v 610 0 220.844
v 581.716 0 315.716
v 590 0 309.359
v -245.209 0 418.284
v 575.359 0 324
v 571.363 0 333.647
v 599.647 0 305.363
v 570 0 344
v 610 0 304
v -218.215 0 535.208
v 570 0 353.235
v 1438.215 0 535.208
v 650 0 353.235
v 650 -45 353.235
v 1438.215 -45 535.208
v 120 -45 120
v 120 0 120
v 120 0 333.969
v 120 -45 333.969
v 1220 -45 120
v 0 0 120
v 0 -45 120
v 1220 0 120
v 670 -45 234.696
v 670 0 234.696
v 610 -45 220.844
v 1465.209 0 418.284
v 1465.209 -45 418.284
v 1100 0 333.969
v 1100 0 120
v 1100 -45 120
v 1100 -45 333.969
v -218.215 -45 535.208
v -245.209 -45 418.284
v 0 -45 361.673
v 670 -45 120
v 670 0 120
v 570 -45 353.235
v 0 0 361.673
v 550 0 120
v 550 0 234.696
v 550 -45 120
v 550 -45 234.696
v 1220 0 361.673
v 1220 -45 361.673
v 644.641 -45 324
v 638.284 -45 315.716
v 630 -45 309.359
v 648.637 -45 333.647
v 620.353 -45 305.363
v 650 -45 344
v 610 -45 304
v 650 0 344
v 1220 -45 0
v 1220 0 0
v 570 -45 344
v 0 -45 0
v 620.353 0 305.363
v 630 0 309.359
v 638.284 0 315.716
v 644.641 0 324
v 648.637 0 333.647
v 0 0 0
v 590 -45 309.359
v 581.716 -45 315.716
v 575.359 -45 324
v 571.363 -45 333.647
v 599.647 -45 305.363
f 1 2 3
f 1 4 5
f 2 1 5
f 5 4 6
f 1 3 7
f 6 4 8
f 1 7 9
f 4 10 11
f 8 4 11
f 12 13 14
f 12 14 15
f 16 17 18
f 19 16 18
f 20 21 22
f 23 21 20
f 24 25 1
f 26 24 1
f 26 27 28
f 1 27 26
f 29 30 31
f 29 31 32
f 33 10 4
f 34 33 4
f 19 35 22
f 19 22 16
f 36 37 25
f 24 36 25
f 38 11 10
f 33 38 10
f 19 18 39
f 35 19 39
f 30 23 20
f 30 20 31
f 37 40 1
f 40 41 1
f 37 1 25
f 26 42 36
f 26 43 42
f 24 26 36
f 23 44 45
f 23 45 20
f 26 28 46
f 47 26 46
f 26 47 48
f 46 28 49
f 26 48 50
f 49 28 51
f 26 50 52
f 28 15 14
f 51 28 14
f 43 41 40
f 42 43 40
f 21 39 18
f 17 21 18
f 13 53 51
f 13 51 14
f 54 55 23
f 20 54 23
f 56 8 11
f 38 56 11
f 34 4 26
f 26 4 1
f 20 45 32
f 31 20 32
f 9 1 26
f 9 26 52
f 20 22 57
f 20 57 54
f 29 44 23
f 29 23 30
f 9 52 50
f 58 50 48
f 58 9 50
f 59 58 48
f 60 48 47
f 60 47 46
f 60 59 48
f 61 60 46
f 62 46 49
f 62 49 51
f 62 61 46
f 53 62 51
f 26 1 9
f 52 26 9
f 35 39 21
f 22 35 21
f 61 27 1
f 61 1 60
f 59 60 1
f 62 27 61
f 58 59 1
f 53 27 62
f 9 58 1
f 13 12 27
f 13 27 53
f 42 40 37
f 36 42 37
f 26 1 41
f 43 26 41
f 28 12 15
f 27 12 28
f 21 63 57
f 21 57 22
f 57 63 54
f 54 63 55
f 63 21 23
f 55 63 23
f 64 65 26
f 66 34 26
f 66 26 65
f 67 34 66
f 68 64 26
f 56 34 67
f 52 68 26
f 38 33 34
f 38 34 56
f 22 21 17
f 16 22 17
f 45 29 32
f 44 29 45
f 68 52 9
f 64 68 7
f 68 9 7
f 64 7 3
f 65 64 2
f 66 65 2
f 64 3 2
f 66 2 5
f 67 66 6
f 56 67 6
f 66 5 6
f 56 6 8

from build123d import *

# Parameters (mm, degrees)
F0_W     = 1220
F0_H     = 120
F1_DEPTH = 45
F3_DEPTH = 45
F5_DEPTH = 45
F9_DEPTH = 45


with BuildPart() as f1:
    # F0 (on Front) → F1 (new body)
    with BuildSketch(Plane.XZ):
        with Locations((610, 60)):
            Rectangle(F0_W, F0_H)
    extrude(amount=F1_DEPTH)


with BuildPart() as f3:
    # F2 (on Front) → F3 (new body)
    with BuildSketch(Plane.XZ):
        with BuildLine():
            Line((570, 344), (570, 353.234728))
            Line((570, 353.234728), (-218.214555, 535.208396))
            Line((-218.214555, 535.208396), (-245.208682, 418.283988))
            Line((-245.208682, 418.283988), (610, 220.843507))
            Line((610, 220.843507), (610, 304))
            ThreePointArc((610, 304), (581.715729, 315.715729), (570, 344))
        make_face()
    extrude(amount=F3_DEPTH)


with BuildPart() as f5:
    # F4 (on Front) → F5 (new body)
    with BuildSketch(Plane.XZ):
        Polygon((0, 361.673104), (0, 120), (120, 120), (120, 333.968921), align=None)
    extrude(amount=F5_DEPTH)


with BuildPart() as f7_1:
    # F7: instance of F1
    add(f1.part.mirror(Plane.YZ.offset(610)))


with BuildPart() as f7_2:
    # F7: instance of F3
    add(f3.part.mirror(Plane.YZ.offset(610)))


with BuildPart() as f7_3:
    # F7: instance of F5
    add(f5.part.mirror(Plane.YZ.offset(610)))


with BuildPart() as f9:
    # F8 (on Front) → F9 (new body)
    with BuildSketch(Plane.XZ):
        Polygon((550, 120), (670, 120), (670, 234.695599), (610, 220.843507), (550, 234.695599), align=None)
    extrude(amount=F9_DEPTH)


solid = Compound([f1.part, f3.part, f5.part, f7_2.part, f7_3.part, f9.part])
